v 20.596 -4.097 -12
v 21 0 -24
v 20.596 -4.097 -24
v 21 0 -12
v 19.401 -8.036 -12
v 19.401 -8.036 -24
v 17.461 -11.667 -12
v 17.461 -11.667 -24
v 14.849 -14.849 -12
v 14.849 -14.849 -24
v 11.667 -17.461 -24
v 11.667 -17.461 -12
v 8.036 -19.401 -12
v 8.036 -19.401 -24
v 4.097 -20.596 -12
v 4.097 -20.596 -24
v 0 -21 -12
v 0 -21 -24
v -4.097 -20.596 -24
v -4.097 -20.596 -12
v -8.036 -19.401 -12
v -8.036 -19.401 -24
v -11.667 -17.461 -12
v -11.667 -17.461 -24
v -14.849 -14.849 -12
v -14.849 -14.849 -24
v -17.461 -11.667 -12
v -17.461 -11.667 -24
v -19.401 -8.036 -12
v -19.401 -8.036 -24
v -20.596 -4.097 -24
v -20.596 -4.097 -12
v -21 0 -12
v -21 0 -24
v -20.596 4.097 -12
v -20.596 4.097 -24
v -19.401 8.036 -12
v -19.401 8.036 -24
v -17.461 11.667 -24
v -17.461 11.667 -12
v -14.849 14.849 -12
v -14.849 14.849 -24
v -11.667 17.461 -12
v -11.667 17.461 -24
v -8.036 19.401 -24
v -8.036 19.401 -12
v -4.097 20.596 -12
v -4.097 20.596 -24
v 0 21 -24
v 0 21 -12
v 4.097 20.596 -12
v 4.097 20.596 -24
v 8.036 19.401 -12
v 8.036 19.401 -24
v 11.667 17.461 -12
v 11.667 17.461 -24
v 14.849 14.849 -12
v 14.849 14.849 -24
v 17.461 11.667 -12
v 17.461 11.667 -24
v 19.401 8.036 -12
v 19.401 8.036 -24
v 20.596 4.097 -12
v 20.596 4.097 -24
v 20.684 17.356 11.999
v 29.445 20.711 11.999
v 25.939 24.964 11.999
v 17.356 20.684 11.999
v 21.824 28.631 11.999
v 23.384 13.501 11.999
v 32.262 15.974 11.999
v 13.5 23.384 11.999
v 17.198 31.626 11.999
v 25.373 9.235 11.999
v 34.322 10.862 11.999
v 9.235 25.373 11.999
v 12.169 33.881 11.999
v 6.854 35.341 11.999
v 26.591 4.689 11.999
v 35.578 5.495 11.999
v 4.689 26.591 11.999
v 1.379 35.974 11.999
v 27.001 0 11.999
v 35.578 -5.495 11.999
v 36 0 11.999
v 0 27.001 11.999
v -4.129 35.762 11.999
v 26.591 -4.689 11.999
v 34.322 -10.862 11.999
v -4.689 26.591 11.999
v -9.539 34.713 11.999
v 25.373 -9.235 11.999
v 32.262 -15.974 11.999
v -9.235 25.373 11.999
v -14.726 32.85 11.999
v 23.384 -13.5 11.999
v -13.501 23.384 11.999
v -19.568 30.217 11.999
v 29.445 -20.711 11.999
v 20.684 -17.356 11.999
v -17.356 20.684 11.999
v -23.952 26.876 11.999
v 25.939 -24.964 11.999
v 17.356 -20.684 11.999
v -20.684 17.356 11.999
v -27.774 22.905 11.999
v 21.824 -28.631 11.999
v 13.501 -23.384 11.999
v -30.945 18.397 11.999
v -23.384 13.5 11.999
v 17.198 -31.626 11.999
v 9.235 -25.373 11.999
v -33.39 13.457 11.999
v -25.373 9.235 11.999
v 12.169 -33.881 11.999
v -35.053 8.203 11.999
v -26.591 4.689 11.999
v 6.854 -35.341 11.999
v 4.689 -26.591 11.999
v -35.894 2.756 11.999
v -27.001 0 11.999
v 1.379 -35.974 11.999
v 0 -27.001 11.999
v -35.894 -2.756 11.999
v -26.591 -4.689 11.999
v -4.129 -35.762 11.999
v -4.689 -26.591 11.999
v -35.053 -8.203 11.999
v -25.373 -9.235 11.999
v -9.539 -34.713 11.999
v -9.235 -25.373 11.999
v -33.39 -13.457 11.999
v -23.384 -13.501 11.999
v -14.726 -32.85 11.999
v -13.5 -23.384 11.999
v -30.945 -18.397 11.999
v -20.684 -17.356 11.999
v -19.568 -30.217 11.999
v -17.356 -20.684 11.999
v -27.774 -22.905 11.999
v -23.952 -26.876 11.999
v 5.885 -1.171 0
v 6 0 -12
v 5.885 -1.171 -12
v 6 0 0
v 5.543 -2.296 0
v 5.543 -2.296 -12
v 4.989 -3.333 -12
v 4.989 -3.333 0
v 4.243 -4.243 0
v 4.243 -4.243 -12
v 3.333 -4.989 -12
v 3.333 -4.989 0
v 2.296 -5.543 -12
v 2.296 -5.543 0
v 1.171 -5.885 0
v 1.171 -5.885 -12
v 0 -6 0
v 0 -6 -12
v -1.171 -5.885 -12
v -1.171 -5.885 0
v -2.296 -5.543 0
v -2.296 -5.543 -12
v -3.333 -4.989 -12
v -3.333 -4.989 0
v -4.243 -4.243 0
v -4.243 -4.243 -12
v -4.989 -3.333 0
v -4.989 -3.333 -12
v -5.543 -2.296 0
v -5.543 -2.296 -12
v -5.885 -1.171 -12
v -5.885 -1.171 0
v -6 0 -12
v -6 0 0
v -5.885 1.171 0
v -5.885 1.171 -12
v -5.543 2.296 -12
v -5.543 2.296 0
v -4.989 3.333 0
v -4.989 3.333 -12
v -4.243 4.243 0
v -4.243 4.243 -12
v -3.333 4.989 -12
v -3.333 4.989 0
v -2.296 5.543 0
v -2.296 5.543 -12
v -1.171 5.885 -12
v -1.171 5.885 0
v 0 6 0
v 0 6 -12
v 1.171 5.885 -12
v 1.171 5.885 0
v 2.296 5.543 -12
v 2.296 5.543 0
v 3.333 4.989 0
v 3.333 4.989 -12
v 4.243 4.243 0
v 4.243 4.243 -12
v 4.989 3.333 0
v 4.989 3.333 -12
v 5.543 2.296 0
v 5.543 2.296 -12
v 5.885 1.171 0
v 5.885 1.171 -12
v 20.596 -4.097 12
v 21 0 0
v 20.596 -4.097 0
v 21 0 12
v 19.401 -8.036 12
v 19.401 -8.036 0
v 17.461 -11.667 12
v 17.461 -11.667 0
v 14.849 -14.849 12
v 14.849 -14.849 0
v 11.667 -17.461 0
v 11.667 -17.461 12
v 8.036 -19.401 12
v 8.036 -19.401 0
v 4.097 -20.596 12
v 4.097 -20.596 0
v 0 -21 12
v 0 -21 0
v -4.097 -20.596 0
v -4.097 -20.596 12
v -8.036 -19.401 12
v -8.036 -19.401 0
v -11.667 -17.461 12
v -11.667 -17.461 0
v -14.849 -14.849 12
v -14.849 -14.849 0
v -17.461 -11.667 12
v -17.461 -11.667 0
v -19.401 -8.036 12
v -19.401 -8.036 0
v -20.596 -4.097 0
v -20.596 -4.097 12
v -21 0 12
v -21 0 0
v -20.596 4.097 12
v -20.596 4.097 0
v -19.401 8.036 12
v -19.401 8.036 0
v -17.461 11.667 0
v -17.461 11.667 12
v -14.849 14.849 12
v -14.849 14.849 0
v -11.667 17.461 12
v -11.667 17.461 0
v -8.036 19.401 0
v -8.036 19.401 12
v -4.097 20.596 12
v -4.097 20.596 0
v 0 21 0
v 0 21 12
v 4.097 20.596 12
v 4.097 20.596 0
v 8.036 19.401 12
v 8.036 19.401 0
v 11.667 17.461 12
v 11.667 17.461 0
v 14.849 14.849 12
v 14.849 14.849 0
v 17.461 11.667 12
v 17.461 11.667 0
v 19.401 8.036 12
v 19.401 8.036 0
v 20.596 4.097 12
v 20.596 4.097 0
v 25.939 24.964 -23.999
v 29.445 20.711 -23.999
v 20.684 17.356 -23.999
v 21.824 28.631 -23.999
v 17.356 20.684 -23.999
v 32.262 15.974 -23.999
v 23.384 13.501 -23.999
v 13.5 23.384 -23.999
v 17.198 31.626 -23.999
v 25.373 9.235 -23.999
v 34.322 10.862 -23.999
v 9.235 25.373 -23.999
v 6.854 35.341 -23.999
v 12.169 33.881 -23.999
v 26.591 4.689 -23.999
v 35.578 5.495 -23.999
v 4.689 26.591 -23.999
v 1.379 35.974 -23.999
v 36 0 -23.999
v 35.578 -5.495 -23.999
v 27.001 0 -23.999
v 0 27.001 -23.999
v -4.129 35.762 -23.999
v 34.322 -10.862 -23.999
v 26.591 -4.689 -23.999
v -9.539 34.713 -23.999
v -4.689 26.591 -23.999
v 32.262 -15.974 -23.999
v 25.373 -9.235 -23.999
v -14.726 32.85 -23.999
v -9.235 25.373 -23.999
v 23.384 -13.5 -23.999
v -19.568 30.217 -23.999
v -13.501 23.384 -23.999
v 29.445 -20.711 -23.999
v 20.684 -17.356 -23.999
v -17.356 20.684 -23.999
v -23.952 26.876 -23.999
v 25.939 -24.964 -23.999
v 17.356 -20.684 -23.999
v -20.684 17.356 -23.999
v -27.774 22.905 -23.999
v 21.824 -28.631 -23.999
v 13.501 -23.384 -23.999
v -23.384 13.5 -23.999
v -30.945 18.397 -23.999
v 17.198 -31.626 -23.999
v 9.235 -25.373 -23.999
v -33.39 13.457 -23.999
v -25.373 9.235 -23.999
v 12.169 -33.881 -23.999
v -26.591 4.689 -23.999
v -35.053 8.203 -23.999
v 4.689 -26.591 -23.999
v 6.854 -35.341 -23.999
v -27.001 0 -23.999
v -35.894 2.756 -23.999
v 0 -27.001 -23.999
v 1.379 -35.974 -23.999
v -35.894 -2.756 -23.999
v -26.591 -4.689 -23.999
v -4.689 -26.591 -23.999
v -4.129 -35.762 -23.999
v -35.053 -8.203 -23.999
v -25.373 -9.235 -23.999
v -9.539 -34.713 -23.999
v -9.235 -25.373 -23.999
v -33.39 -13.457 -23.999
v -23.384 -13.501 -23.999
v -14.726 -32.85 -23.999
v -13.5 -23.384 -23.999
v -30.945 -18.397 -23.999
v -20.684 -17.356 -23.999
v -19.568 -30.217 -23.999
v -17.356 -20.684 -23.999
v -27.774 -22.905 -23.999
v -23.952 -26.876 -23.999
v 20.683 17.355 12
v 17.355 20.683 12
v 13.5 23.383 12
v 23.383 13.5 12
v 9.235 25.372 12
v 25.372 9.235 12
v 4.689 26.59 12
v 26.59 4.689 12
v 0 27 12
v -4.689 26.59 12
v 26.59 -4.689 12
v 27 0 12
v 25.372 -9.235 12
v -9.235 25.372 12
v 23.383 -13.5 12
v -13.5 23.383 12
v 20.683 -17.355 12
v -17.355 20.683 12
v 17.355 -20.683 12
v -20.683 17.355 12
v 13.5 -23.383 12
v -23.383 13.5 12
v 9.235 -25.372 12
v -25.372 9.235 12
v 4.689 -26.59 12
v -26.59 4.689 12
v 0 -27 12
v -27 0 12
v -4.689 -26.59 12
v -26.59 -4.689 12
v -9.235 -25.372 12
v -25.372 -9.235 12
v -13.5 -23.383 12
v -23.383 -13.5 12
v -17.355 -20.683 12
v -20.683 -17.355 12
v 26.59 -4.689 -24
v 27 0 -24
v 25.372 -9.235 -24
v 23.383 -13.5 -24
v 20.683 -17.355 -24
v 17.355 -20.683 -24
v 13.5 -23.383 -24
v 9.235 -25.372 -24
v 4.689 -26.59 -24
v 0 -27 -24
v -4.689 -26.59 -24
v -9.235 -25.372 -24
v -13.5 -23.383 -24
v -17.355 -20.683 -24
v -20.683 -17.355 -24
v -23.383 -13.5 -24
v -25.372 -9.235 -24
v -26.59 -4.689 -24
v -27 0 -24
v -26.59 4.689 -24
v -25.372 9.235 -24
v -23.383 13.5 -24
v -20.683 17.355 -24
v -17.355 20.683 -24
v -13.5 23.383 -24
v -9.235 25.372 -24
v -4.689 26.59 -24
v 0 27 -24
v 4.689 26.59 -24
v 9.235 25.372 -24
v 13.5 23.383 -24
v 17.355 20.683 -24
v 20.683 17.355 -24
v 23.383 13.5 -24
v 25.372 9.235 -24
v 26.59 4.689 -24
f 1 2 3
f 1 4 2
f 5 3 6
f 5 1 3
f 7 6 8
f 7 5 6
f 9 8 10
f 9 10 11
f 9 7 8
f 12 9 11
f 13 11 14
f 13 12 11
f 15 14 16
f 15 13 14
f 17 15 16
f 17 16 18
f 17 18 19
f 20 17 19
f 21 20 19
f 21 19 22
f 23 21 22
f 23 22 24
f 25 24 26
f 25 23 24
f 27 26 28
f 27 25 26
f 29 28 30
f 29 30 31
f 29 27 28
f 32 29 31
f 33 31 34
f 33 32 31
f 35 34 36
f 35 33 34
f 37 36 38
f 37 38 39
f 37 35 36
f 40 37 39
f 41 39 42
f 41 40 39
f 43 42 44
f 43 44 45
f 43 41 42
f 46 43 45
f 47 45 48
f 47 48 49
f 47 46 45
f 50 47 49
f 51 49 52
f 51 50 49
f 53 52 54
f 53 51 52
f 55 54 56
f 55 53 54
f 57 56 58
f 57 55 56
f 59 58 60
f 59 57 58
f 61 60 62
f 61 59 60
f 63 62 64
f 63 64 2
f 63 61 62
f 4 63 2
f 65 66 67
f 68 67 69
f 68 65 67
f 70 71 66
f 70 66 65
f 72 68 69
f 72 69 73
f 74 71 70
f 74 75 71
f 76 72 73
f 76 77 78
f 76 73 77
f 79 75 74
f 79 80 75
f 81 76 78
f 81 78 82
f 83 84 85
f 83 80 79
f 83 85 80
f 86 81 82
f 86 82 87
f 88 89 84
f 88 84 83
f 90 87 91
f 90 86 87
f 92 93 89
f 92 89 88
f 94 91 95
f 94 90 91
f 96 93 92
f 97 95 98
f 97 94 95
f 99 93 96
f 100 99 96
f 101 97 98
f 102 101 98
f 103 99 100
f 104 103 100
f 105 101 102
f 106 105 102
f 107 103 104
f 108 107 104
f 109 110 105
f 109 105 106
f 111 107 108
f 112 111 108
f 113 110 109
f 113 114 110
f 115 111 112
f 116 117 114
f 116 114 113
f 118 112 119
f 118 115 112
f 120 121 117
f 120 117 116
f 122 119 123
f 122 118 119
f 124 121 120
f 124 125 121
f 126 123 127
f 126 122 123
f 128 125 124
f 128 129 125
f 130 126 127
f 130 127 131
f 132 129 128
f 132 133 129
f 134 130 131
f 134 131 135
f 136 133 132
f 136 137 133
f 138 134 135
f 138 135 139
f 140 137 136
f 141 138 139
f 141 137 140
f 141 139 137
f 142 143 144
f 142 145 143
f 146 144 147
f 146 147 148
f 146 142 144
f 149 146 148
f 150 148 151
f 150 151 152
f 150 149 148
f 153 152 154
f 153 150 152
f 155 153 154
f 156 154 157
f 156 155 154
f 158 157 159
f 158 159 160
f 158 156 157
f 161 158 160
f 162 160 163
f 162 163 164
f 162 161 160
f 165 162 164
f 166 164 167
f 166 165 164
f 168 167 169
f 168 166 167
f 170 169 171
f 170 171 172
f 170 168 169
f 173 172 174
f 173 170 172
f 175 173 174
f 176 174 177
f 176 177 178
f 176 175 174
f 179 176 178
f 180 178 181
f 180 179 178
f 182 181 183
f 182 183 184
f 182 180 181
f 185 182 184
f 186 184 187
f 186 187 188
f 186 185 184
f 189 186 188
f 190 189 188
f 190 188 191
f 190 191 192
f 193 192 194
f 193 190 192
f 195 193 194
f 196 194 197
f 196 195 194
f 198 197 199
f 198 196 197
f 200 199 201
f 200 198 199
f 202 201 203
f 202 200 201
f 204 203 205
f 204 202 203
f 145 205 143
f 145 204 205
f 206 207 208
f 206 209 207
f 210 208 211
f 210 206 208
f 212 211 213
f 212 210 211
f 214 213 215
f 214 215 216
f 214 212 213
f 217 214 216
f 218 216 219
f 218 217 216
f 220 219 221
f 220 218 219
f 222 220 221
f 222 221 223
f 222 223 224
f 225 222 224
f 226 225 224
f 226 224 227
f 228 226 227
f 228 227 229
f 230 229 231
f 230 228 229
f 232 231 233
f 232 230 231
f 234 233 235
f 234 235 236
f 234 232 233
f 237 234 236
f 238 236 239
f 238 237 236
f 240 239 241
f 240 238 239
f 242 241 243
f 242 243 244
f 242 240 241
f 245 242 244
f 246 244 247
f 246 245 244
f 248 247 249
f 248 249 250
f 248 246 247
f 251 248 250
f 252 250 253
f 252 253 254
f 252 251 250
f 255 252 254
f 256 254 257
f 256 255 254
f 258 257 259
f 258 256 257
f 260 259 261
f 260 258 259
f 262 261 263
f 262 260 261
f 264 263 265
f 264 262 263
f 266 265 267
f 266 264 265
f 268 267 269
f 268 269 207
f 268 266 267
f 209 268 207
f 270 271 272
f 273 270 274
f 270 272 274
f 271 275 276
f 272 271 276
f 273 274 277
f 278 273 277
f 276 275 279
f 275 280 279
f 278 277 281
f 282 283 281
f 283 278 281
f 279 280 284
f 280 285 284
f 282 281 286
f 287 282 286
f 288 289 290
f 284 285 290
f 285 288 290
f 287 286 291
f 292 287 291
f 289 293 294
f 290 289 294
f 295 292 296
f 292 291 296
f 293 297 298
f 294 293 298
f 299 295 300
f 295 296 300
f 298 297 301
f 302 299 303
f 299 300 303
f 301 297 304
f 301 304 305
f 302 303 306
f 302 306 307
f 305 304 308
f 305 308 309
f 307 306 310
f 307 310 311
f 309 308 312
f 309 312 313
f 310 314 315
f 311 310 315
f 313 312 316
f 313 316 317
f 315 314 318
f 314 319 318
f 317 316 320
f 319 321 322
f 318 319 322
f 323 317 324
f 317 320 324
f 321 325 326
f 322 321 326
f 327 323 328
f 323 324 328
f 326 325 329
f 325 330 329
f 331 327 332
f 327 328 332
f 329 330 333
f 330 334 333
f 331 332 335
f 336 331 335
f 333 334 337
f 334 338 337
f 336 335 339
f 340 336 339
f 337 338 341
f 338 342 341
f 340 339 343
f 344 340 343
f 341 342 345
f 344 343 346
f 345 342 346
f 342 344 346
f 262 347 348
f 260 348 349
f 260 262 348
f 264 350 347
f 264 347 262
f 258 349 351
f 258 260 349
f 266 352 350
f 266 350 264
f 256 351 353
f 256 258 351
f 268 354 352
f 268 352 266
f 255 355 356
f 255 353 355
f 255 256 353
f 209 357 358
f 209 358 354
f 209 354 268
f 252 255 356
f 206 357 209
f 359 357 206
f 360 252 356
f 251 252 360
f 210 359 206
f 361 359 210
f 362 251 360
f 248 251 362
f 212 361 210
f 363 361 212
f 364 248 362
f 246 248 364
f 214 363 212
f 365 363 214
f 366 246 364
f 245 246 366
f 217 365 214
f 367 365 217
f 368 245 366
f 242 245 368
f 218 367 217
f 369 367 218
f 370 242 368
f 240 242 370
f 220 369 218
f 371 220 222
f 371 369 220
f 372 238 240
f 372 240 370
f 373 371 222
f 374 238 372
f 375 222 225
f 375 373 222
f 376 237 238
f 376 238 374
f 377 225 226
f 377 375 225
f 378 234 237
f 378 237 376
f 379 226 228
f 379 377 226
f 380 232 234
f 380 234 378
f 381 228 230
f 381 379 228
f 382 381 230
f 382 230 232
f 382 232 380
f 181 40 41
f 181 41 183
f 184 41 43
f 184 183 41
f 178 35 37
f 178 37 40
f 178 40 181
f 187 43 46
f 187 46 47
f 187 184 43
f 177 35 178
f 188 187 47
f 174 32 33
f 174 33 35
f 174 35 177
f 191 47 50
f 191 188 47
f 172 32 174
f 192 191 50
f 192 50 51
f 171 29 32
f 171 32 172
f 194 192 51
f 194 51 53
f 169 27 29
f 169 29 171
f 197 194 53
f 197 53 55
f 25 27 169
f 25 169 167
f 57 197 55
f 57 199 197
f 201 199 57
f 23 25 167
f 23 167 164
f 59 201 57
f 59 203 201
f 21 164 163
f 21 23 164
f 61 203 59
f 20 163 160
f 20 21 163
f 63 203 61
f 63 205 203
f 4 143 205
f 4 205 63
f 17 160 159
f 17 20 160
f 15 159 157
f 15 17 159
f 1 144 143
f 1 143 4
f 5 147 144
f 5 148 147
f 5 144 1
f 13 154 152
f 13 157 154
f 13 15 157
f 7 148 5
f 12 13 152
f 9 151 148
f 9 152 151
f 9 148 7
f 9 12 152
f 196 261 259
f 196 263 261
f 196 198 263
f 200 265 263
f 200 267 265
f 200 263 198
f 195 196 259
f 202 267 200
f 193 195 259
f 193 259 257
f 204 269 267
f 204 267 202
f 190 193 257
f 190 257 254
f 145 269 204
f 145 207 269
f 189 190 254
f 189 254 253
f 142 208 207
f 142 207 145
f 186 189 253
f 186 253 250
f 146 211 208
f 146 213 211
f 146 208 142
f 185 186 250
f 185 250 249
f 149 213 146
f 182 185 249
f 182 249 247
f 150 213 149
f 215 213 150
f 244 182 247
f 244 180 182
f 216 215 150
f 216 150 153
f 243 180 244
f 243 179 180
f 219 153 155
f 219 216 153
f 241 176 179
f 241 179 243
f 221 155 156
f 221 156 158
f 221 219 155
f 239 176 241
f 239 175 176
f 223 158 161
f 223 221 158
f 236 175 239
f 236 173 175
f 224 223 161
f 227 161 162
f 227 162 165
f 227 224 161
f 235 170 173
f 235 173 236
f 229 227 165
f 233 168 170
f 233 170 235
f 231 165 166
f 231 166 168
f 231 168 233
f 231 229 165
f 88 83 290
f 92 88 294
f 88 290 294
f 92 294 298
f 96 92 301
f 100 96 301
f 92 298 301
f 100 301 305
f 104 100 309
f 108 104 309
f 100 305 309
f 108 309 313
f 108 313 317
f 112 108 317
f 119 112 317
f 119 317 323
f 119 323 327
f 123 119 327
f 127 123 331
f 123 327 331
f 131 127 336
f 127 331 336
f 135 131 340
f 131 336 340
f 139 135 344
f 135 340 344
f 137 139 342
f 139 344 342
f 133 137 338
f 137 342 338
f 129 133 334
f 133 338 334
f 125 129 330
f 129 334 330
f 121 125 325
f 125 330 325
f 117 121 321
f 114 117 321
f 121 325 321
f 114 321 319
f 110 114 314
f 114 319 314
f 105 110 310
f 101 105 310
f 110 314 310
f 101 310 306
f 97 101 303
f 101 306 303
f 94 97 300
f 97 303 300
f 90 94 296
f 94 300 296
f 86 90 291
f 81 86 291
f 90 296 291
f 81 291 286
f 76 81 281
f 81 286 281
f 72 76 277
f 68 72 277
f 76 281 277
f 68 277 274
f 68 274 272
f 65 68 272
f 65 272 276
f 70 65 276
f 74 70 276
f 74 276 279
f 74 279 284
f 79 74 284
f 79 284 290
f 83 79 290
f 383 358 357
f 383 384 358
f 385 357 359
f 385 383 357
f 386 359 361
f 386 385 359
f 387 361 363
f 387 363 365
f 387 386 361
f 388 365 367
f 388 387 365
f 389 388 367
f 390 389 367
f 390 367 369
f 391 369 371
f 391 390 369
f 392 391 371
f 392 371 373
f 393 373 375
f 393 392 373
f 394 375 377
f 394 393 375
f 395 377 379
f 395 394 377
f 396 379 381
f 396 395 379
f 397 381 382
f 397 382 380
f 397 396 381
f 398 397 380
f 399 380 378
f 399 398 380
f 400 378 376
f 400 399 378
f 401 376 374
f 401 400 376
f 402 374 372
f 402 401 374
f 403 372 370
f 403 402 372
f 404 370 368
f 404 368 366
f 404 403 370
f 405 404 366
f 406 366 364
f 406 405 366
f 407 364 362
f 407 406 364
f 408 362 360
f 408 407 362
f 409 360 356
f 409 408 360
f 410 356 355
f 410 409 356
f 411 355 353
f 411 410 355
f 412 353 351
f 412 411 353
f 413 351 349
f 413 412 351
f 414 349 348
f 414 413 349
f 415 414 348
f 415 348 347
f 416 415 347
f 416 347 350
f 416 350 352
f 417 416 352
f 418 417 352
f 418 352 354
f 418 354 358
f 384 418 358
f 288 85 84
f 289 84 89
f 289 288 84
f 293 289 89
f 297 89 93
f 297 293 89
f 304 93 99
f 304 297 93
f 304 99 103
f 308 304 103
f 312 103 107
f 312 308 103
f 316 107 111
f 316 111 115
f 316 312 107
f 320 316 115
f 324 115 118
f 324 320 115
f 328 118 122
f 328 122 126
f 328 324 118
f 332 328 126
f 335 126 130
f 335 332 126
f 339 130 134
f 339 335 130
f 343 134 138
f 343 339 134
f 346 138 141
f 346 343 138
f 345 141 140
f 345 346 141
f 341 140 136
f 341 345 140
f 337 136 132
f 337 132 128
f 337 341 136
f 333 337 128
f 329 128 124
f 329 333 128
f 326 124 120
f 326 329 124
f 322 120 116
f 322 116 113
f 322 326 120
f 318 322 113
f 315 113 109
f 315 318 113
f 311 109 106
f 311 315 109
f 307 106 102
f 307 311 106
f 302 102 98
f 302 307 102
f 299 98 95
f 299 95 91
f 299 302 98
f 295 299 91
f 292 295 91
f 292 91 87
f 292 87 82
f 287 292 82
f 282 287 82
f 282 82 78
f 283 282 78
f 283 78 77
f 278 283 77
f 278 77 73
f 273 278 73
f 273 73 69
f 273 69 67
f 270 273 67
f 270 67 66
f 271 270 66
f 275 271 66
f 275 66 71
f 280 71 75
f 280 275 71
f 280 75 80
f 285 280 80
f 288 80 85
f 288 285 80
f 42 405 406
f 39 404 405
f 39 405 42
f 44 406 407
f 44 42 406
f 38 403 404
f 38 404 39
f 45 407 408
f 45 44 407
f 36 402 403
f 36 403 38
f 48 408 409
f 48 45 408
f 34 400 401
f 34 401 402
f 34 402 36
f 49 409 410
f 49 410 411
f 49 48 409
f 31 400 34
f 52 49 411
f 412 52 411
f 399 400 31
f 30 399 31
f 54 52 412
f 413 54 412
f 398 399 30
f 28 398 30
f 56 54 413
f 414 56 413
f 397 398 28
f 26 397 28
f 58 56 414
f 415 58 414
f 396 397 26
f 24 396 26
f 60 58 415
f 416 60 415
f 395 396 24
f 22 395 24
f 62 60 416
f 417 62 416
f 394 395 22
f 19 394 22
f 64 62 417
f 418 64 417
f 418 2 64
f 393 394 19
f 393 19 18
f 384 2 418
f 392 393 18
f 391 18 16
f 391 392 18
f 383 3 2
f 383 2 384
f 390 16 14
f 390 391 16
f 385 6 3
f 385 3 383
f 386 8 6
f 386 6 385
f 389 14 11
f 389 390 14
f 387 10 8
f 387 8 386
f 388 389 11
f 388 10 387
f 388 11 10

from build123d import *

# Parameters (mm, degrees)
SKETCH3_W = 35.998
SKETCH3_H = 8.999


with BuildPart() as part:
    # Sketch1 → Revolve1 (revolve)
    with BuildSketch(Plane(origin=(0, 0, 0), x_dir=(0, 0, -1), z_dir=(1, 0, 0)), mode=Mode.PRIVATE) as revolve1_sk:
        Polygon((0, 6), (0, 21), (-12, 21), (-12, 27), (24, 27), (24, 21), (12, 21), (12, 6), align=None)
    revolve(revolve1_sk.sketch.rotate(Axis((0, 0, 0), (0, 0, -1)), 90), axis=Axis((0, 0, 0), (0, 0, -1)))


with BuildPart() as body_2:
    # Sketch3 → Revolve2 (revolve)
    with BuildSketch(Plane(origin=(0, 0, 0), x_dir=(0, 0, -1), z_dir=(1, 0, 0)), mode=Mode.PRIVATE) as revolve2_sk:
        with Locations((6, 31.5005)):
            Rectangle(SKETCH3_W, SKETCH3_H)
    revolve(revolve2_sk.sketch.rotate(Axis((0, 0, 0), (0, 0, -1)), 90), axis=Axis((0, 0, 0), (0, 0, -1)))


solid = Compound([part.part, body_2.part])
